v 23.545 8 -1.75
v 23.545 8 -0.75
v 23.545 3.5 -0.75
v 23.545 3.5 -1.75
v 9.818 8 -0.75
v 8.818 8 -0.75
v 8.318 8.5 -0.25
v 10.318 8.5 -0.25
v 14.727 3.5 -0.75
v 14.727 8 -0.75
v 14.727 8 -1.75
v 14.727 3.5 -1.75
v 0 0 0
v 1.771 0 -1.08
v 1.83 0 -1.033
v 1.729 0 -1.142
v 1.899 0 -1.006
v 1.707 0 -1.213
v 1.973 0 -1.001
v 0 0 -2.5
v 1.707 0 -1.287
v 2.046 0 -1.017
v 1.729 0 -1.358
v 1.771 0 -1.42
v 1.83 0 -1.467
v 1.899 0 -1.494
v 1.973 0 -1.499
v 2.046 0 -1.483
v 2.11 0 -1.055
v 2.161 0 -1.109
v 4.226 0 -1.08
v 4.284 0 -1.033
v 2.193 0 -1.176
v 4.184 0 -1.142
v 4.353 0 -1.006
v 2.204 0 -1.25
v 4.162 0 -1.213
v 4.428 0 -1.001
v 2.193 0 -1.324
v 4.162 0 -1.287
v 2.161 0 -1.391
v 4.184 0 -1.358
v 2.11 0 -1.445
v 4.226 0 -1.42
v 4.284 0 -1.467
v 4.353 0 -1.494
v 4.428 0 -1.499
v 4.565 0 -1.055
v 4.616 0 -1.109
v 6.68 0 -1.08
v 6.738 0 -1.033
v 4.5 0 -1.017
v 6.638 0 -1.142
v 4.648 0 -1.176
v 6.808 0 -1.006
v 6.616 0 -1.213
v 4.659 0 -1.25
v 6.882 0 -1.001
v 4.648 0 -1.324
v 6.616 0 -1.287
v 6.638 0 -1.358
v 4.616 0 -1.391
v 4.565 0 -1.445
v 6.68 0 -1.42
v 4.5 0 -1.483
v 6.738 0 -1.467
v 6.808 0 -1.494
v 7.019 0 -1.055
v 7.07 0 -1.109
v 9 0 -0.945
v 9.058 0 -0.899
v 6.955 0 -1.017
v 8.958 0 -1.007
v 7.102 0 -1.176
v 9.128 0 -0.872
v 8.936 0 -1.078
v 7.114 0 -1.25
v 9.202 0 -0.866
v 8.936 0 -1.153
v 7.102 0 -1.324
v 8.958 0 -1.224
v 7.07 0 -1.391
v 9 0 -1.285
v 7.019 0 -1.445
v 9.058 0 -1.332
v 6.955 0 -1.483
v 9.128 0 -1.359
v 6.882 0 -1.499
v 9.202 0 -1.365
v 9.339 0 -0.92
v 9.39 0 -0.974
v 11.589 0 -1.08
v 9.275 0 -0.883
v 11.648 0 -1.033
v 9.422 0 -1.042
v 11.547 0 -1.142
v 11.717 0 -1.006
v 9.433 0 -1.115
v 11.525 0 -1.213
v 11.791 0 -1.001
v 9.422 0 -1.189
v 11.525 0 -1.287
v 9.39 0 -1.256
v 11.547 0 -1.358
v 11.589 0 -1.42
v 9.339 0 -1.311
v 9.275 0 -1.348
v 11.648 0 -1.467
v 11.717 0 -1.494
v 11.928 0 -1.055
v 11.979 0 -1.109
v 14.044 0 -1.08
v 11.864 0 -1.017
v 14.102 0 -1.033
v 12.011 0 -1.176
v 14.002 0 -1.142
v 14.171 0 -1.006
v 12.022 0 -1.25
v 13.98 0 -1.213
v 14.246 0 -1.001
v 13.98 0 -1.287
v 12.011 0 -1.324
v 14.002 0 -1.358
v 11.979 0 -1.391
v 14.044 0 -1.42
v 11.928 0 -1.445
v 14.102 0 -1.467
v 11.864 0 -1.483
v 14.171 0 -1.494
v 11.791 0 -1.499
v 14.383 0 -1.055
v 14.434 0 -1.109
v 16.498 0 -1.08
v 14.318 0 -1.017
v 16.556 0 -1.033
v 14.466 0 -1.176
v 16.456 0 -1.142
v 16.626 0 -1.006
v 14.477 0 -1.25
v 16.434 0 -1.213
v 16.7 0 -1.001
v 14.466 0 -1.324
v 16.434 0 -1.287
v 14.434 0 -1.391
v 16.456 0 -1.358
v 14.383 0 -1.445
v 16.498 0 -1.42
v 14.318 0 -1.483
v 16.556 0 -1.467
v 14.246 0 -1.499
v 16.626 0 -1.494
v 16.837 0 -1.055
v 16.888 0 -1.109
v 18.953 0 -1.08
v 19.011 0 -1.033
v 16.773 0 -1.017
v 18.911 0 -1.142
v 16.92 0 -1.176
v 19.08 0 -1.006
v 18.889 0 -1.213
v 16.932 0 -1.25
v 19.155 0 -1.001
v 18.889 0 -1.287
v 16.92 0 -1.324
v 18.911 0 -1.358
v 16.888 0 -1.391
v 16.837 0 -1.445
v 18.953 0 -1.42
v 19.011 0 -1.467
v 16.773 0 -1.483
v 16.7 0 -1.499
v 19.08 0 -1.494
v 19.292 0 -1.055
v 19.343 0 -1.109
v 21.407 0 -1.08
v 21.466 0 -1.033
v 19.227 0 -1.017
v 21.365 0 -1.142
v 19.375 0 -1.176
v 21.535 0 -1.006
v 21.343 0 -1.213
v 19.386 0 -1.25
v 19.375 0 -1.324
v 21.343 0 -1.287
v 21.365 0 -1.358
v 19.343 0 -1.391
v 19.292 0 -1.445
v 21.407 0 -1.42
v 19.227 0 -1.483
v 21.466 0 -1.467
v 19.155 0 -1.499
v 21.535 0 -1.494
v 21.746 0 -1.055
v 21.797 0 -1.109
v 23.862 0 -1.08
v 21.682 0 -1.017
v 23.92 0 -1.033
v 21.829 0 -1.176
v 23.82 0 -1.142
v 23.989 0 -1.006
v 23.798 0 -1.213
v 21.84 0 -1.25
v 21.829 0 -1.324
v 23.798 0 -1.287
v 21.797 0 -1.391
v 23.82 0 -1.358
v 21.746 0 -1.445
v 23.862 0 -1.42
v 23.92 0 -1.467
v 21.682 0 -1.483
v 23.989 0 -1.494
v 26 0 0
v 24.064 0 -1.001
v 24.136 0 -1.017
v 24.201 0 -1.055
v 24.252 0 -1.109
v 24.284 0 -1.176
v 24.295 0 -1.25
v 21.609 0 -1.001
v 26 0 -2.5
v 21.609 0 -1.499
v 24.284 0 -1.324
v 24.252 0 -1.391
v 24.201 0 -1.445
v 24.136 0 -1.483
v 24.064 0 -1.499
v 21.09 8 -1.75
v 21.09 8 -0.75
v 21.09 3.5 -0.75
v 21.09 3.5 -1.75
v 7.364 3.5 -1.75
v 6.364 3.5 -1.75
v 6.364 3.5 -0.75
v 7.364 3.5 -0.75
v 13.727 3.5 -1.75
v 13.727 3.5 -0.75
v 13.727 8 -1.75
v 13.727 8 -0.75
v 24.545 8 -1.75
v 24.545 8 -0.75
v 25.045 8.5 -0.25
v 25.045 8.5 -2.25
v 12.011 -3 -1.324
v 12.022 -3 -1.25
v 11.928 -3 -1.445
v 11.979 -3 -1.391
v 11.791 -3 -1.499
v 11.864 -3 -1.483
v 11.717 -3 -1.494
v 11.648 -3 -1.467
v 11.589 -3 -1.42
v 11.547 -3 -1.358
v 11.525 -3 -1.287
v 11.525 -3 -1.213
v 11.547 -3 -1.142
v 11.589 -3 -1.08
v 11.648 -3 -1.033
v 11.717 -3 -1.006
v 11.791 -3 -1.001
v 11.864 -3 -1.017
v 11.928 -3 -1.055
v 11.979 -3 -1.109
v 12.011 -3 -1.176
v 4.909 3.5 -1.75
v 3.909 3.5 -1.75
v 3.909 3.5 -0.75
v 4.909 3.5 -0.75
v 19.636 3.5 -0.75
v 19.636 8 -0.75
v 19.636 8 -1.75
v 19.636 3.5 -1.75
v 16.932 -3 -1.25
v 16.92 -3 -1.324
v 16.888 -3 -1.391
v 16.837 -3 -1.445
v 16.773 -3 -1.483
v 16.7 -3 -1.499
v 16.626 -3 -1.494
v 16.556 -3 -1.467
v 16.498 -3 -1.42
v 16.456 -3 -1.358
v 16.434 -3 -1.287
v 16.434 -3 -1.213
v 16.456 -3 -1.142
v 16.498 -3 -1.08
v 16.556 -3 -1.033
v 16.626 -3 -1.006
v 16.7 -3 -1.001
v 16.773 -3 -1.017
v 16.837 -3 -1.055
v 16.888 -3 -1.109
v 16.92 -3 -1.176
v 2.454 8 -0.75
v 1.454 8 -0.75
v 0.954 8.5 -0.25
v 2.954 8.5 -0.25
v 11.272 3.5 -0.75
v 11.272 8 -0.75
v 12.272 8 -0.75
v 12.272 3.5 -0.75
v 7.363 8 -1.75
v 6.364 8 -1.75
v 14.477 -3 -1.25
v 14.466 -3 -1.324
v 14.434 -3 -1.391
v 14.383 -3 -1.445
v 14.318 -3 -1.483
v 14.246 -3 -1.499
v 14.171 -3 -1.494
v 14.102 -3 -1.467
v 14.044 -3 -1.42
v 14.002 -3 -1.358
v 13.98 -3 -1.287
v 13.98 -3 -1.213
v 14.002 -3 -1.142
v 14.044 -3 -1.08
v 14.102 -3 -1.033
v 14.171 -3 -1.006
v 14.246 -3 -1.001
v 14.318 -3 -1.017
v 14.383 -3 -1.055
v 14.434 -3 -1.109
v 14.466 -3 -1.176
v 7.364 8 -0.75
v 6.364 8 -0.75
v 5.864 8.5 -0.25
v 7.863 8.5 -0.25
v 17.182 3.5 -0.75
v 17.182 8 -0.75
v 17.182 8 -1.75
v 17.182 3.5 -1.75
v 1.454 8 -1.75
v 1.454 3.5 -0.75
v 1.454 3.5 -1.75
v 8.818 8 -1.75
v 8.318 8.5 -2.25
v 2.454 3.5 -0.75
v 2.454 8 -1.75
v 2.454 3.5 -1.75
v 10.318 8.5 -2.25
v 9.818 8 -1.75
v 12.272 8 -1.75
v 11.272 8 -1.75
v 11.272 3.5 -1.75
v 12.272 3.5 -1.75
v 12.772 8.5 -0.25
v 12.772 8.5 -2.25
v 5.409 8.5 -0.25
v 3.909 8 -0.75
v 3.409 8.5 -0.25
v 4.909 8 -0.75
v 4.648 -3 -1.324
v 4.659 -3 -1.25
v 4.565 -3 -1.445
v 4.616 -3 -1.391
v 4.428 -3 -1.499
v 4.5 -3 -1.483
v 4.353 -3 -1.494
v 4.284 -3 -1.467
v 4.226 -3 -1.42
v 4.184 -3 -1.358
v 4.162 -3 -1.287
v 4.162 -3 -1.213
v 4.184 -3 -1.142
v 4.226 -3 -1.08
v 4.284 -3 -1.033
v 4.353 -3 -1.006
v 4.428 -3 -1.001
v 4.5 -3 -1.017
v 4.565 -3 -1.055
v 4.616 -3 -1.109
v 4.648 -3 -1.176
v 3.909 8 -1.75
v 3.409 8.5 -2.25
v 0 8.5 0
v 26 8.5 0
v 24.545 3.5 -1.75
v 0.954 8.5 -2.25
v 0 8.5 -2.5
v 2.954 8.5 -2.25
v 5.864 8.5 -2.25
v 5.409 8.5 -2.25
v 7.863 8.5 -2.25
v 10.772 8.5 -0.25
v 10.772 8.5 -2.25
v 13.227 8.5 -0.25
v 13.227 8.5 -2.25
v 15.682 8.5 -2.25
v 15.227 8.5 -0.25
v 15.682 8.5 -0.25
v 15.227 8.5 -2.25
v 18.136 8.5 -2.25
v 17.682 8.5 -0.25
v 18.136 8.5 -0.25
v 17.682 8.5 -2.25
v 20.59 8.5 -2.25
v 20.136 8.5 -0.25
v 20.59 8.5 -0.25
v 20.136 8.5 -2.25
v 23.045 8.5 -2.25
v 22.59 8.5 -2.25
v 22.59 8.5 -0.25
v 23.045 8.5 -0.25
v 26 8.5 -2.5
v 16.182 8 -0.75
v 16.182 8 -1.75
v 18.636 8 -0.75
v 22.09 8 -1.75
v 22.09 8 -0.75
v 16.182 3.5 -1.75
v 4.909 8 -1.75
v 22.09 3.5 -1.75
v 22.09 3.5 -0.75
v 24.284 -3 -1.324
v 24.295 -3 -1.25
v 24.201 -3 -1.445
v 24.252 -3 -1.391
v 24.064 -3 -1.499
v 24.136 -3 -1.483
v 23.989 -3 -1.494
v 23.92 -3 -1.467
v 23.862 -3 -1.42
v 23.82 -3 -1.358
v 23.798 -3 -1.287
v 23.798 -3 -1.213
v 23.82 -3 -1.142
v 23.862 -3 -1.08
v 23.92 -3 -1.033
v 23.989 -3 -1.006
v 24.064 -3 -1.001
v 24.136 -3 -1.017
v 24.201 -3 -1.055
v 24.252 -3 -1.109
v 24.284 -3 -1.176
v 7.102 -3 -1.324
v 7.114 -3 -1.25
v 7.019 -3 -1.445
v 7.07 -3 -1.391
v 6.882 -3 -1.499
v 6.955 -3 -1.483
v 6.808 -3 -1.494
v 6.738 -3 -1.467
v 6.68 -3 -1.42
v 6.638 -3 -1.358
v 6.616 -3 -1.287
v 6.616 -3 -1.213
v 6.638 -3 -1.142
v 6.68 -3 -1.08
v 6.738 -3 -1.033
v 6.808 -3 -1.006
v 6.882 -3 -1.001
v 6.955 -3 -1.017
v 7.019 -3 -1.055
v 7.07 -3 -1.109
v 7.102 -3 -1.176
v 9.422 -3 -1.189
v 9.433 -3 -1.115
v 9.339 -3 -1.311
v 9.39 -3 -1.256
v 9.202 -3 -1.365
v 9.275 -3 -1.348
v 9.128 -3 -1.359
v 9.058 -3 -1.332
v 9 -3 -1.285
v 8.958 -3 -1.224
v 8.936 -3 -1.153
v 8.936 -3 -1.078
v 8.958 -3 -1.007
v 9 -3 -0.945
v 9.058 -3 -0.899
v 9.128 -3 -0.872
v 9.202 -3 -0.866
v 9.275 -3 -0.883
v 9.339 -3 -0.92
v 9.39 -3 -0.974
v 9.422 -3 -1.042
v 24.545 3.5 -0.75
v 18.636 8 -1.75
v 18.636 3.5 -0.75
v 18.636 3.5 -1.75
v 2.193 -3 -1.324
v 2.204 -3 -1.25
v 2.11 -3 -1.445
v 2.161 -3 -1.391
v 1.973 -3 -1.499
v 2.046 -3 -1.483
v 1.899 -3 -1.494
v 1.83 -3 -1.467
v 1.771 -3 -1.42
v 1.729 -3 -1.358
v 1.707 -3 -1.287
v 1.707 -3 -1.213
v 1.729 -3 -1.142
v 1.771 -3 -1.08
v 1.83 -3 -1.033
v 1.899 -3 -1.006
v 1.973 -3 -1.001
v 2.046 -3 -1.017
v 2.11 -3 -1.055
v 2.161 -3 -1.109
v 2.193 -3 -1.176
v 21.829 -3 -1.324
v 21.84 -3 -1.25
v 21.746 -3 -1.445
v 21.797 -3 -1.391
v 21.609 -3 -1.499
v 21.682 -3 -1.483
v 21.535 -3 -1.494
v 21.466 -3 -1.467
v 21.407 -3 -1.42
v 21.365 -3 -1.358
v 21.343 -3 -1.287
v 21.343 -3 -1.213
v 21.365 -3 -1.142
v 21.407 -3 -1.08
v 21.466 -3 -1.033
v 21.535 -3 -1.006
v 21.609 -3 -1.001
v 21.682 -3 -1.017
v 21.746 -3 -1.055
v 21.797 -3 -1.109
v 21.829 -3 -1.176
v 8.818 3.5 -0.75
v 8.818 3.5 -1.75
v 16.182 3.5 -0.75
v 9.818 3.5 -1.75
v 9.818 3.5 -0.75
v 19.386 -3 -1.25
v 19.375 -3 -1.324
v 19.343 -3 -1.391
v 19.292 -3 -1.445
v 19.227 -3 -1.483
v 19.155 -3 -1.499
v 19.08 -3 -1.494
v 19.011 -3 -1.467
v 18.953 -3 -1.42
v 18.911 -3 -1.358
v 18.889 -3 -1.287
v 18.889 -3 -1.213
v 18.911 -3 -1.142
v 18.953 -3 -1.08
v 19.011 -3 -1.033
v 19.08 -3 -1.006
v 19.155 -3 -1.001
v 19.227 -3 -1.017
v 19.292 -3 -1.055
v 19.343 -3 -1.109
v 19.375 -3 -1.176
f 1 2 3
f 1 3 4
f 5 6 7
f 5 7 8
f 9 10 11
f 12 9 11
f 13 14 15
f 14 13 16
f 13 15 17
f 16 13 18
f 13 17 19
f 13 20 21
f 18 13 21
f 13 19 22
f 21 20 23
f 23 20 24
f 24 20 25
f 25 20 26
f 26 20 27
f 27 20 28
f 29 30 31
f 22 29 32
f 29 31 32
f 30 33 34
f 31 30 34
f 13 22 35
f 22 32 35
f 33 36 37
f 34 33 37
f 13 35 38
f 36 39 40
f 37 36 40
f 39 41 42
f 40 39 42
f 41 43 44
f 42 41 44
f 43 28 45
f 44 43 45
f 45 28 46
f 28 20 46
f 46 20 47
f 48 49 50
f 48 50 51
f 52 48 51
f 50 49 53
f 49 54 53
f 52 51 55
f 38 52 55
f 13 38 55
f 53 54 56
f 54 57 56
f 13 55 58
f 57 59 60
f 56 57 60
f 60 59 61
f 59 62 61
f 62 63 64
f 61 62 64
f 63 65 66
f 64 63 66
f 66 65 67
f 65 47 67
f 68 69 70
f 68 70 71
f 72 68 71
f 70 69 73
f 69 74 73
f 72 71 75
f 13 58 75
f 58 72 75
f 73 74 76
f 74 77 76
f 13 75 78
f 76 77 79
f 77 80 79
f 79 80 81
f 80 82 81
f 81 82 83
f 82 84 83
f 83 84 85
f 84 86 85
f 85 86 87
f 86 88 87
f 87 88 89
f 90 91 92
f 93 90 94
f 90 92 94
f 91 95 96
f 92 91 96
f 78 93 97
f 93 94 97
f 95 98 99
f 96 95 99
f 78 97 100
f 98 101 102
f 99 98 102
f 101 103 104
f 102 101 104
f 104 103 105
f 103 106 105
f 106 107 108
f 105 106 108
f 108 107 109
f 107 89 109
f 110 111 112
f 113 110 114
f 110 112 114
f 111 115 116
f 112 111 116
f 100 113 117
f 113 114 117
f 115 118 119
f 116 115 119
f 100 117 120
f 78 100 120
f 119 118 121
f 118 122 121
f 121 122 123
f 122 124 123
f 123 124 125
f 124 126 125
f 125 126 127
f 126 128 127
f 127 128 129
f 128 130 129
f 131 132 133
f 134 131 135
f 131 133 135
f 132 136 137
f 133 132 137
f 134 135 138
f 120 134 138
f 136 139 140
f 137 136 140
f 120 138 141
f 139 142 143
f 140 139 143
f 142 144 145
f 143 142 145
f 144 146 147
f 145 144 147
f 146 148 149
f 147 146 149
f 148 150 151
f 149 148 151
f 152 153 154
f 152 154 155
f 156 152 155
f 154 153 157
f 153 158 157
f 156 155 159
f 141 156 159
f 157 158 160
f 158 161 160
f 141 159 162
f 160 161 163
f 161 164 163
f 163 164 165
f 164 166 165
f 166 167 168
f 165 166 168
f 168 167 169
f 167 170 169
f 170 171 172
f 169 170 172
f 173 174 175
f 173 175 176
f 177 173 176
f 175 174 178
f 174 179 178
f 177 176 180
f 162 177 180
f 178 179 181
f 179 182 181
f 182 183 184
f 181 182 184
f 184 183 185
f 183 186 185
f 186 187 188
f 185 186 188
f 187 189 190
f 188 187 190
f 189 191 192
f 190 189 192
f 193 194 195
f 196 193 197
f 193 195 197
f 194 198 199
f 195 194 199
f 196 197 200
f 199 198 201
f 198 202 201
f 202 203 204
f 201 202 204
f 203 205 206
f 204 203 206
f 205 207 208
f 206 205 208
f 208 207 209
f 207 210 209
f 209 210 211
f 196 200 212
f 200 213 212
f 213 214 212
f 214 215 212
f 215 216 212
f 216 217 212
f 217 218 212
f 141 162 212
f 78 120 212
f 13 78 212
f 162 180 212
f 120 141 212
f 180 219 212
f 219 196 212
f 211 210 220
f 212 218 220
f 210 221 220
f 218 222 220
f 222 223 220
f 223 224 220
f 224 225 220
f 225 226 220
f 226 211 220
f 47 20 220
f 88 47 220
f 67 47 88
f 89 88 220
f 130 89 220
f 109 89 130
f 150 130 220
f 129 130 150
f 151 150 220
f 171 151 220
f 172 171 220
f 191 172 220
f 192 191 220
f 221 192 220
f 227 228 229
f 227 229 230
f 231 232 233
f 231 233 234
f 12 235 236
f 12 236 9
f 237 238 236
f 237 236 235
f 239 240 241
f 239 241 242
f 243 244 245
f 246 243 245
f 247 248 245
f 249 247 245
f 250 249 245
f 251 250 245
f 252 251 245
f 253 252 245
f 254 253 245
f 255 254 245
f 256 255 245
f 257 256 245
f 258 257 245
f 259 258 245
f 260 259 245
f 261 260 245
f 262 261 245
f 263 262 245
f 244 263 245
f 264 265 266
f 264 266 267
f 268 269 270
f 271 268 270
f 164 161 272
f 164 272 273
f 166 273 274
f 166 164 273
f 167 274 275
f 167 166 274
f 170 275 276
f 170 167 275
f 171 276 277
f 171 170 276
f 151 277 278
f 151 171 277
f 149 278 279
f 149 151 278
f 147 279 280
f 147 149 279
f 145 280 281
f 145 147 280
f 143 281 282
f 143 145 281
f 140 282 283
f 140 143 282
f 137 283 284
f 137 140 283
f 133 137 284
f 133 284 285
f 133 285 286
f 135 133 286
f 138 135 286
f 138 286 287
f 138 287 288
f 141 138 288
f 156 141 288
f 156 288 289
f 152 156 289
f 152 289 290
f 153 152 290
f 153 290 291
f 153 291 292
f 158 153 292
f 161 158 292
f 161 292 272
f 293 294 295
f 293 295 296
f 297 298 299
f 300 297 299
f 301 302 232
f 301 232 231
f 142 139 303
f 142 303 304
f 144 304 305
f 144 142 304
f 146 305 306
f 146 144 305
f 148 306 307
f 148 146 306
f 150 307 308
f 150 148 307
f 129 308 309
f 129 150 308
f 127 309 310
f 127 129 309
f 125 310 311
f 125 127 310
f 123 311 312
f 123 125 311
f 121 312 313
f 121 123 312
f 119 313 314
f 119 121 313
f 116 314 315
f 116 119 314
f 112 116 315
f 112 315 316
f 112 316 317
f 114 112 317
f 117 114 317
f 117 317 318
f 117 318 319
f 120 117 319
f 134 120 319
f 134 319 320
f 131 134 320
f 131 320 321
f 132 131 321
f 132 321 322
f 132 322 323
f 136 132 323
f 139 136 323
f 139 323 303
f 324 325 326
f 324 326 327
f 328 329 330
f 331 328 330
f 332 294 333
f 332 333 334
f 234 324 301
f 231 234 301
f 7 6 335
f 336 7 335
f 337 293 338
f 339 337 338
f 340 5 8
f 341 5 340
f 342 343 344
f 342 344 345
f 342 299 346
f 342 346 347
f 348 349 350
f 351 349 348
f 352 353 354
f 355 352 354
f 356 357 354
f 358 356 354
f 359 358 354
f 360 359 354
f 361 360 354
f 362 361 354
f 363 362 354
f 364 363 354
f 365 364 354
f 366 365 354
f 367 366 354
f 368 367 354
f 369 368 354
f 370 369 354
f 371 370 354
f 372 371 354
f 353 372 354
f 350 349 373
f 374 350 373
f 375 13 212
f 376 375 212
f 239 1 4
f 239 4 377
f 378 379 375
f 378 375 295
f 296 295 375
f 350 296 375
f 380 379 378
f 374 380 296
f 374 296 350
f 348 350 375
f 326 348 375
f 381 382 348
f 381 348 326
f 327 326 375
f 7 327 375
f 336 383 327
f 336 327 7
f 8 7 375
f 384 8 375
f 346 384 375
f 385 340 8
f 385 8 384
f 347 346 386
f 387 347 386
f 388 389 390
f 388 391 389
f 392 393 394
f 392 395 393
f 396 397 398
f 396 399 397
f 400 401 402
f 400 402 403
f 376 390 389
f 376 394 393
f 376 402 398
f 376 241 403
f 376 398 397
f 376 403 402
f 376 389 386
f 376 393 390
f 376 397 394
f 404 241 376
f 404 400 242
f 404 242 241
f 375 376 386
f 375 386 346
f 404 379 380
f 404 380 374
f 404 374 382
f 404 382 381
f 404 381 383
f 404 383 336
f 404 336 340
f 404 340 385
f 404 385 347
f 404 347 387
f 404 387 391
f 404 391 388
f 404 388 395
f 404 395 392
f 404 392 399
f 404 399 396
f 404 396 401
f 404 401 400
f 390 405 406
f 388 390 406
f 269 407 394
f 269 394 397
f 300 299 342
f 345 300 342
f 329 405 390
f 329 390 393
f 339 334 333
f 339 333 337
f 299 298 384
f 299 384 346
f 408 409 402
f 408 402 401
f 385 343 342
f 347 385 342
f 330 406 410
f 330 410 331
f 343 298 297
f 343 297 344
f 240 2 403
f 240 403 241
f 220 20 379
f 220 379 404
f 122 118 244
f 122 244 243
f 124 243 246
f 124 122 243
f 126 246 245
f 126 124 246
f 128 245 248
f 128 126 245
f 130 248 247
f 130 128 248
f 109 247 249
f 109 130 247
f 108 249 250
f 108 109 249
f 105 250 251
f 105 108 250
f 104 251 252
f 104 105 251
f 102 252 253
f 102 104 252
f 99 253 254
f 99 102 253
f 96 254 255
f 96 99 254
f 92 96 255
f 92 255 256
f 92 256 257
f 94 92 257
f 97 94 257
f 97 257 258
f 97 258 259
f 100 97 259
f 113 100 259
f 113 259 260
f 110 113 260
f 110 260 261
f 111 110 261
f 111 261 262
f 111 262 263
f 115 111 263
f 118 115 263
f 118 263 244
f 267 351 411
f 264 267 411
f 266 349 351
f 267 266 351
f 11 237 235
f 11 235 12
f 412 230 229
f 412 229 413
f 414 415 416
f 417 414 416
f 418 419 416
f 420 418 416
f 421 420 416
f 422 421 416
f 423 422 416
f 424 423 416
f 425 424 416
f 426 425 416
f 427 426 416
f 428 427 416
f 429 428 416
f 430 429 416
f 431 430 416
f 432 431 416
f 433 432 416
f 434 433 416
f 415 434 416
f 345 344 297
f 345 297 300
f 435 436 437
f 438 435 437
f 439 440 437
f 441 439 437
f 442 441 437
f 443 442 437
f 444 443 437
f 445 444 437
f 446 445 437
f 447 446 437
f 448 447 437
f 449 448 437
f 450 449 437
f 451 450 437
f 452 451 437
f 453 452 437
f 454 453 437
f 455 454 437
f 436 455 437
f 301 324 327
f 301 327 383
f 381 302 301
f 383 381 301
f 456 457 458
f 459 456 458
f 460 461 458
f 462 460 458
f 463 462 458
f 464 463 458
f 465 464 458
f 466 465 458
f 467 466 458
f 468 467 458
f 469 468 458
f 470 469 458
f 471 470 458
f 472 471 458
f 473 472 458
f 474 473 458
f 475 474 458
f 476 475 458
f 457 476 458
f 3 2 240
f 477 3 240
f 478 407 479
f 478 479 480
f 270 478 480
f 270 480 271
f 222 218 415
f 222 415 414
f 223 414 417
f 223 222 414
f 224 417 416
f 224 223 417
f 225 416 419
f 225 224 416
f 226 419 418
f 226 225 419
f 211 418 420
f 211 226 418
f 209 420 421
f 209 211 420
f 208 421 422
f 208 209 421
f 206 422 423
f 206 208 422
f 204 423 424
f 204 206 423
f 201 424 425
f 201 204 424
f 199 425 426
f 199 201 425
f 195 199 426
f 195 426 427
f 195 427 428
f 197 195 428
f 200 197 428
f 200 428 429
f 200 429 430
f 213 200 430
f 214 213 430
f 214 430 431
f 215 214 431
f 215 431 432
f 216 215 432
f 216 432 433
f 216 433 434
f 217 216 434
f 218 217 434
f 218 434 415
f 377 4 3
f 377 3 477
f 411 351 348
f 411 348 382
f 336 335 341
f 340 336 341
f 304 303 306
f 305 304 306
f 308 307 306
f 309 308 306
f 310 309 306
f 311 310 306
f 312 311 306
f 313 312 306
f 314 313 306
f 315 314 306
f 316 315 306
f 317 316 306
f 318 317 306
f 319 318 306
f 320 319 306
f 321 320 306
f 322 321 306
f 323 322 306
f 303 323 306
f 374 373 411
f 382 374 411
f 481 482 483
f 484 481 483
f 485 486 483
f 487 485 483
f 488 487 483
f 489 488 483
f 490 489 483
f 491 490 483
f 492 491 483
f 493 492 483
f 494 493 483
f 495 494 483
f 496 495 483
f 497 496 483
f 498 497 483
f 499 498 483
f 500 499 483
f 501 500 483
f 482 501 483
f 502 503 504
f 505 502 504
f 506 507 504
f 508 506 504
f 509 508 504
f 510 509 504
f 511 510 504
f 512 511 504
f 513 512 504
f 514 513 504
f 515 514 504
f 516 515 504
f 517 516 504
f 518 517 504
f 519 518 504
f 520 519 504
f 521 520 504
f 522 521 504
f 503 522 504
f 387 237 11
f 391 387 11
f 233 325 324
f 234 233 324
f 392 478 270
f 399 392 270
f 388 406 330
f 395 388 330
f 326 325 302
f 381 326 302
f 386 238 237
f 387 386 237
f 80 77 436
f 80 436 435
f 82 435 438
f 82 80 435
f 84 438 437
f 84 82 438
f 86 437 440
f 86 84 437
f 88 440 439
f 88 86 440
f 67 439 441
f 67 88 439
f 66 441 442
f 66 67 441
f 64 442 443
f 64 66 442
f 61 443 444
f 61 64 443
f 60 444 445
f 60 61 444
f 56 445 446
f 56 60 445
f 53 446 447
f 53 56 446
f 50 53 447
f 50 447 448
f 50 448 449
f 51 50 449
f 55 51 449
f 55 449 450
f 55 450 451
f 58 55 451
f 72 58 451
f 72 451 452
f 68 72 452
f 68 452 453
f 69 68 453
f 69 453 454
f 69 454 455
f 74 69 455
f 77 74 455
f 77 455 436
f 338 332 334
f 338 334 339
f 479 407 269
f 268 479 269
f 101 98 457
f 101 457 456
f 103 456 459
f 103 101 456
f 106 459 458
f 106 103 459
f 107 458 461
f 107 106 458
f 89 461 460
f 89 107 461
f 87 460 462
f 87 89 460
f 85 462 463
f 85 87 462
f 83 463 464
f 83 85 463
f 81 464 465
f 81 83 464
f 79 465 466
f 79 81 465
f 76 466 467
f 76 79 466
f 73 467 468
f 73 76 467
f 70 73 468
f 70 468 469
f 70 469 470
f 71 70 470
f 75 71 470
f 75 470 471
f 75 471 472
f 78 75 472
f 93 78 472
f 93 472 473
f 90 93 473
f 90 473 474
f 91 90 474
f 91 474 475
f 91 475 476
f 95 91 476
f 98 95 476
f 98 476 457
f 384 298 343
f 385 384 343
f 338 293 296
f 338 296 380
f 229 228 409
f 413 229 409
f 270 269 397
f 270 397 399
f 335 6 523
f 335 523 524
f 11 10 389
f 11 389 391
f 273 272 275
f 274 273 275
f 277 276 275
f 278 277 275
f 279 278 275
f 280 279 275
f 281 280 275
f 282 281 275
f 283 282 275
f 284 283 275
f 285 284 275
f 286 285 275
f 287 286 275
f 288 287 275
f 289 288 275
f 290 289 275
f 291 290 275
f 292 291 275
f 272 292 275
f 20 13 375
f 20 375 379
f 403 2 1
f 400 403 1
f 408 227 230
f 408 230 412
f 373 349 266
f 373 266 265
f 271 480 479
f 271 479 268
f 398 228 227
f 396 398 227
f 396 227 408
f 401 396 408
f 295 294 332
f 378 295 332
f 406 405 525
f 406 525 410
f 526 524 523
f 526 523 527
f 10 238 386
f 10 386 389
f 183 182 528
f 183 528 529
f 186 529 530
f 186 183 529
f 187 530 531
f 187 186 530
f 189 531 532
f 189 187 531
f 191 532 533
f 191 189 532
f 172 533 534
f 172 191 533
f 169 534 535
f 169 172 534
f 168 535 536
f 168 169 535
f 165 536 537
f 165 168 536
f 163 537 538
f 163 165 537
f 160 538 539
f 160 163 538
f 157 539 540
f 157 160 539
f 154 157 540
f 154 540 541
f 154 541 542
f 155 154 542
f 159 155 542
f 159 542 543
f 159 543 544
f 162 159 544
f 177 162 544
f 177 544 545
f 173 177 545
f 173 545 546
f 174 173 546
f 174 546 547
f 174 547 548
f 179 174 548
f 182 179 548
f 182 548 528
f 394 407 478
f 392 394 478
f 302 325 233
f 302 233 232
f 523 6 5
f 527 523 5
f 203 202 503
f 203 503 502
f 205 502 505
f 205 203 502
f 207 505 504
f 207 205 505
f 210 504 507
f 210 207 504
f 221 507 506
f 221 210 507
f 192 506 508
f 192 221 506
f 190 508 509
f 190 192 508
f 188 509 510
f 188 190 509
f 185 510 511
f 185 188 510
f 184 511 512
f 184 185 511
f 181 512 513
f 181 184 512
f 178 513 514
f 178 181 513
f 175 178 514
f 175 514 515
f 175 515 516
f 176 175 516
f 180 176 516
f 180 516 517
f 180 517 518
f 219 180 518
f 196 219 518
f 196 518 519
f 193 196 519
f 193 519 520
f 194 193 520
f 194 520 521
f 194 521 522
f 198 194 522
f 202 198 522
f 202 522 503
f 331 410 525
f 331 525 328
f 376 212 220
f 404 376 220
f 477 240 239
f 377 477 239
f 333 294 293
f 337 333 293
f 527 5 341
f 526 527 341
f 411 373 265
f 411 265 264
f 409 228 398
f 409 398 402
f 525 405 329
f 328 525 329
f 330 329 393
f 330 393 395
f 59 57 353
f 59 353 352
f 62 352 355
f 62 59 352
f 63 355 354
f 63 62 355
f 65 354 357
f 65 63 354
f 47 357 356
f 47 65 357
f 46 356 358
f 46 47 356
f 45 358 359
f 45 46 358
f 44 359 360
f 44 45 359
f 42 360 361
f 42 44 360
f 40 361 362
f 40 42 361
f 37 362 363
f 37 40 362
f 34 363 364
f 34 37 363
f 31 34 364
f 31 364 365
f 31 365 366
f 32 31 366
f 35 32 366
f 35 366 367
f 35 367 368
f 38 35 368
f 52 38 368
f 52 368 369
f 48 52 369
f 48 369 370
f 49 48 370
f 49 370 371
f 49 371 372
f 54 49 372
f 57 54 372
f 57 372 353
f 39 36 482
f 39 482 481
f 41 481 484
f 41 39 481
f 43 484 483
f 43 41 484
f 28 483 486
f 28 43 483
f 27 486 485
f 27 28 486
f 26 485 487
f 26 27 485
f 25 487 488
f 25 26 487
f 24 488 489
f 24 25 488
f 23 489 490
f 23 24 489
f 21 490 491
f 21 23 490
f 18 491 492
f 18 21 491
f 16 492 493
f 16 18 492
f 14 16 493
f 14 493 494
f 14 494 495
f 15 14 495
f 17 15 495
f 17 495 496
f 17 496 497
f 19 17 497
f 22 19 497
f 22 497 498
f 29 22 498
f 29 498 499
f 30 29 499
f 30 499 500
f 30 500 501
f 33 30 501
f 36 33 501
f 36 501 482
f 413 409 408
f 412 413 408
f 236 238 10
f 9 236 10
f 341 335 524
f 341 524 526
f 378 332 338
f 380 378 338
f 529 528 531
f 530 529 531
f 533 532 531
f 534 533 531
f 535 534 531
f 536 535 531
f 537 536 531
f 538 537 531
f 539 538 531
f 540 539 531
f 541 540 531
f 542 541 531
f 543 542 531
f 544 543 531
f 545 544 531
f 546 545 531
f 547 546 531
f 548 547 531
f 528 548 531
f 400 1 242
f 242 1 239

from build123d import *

# Parameters (mm, degrees)
SKETCH1_W           = 26
SKETCH1_H           = 2.5
BOSS_EXTRUDE1_DEPTH = 8.5
SKETCH2_W           = 1
SKETCH2_H           = 1
CUT_EXTRUDE1_DEPTH  = 5
CHAMFER1_SIZE       = 0.5
SKETCH3_R           = 0.25
BOSS_EXTRUDE2_DEPTH = 6.5


with BuildPart() as part:
    # Sketch1 → Boss-Extrude1 (new body)
    with BuildSketch(Plane(origin=(0, 0, 0), x_dir=(1, 0, 0), z_dir=(0, 1, 0))):
        with Locations((13, 1.25)):
            Rectangle(SKETCH1_W, SKETCH1_H)
    extrude(amount=BOSS_EXTRUDE1_DEPTH)

    # Sketch2 → Cut-Extrude1 (cut)
    with BuildSketch(Plane(origin=(0, 8.5, 0), x_dir=(1, 0, 0), z_dir=(0, 1, 0))):
        with Locations((1.9545, 1.25)):
            Rectangle(SKETCH2_W, SKETCH2_H)
        with Locations((4.409, 1.25)):
            Rectangle(SKETCH2_W, SKETCH2_H)
        with Locations((6.8635, 1.25)):
            Rectangle(SKETCH2_W, SKETCH2_H)
        with Locations((9.318, 1.25)):
            Rectangle(SKETCH2_W, SKETCH2_H)
        with Locations((11.7725, 1.25)):
            Rectangle(SKETCH2_W, SKETCH2_H)
        with Locations((14.227, 1.25)):
            Rectangle(SKETCH2_W, SKETCH2_H)
        with Locations((16.6815, 1.25)):
            Rectangle(SKETCH2_W, SKETCH2_H)
        with Locations((19.136, 1.25)):
            Rectangle(SKETCH2_W, SKETCH2_H)
        with Locations((21.5905, 1.25)):
            Rectangle(SKETCH2_W, SKETCH2_H)
        with Locations((24.045, 1.25)):
            Rectangle(SKETCH2_W, SKETCH2_H)
    extrude(amount=-CUT_EXTRUDE1_DEPTH, mode=Mode.SUBTRACT)

    # Chamfer1
    chamfer1_edges = [part.edges().sort_by_distance(p)[0] for p in [
        (21.0905, 8.5, -1.25),
        (21.5905, 8.5, -0.75),
        (22.0905, 8.5, -1.25),
        (21.5905, 8.5, -1.75),
        (23.545, 8.5, -1.25),
        (24.045, 8.5, -0.75),
        (24.545, 8.5, -1.25),
        (24.045, 8.5, -1.75),
        (1.4545, 8.5, -1.25),
        (1.9545, 8.5, -0.75),
        (2.4545, 8.5, -1.25),
        (1.9545, 8.5, -1.75),
        (3.909, 8.5, -1.25),
        (4.409, 8.5, -0.75),
        (4.909, 8.5, -1.25),
        (4.409, 8.5, -1.75),
        (6.3635, 8.5, -1.25),
        (6.8635, 8.5, -0.75),
        (7.3635, 8.5, -1.25),
        (6.8635, 8.5, -1.75),
        (8.818, 8.5, -1.25),
        (9.318, 8.5, -0.75),
        (9.818, 8.5, -1.25),
        (9.318, 8.5, -1.75),
        (11.2725, 8.5, -1.25),
        (11.7725, 8.5, -0.75),
        (12.2725, 8.5, -1.25),
        (11.7725, 8.5, -1.75),
        (13.727, 8.5, -1.25),
        (14.227, 8.5, -0.75),
        (14.727, 8.5, -1.25),
        (14.227, 8.5, -1.75),
        (16.1815, 8.5, -1.25),
        (16.6815, 8.5, -0.75),
        (17.1815, 8.5, -1.25),
        (16.6815, 8.5, -1.75),
        (18.636, 8.5, -1.25),
        (19.136, 8.5, -0.75),
        (19.636, 8.5, -1.25),
        (19.136, 8.5, -1.75),
    ]]
    chamfer(chamfer1_edges, length=CHAMFER1_SIZE)

    # Sketch3 → Boss-Extrude2 (add)
    with BuildSketch(Plane(origin=(0, 3.5, 0), x_dir=(1, 0, 0), z_dir=(0, 1, 0))):
        with Locations((1.9545, 1.25)):
            Circle(SKETCH3_R)
        with Locations((4.409, 1.25)):
            Circle(SKETCH3_R)
        with Locations((6.8635, 1.25)):
            Circle(SKETCH3_R)
        with Locations((9.183250215, 1.115250215)):
            Circle(SKETCH3_R)
        with Locations((11.7725, 1.25)):
            Circle(SKETCH3_R)
        with Locations((14.227, 1.25)):
            Circle(SKETCH3_R)
        with Locations((16.6815, 1.25)):
            Circle(SKETCH3_R)
        with Locations((19.136, 1.25)):
            Circle(SKETCH3_R)
        with Locations((21.5905, 1.25)):
            Circle(SKETCH3_R)
        with Locations((24.045, 1.25)):
            Circle(SKETCH3_R)
    extrude(amount=-BOSS_EXTRUDE2_DEPTH)


solid = part.part
